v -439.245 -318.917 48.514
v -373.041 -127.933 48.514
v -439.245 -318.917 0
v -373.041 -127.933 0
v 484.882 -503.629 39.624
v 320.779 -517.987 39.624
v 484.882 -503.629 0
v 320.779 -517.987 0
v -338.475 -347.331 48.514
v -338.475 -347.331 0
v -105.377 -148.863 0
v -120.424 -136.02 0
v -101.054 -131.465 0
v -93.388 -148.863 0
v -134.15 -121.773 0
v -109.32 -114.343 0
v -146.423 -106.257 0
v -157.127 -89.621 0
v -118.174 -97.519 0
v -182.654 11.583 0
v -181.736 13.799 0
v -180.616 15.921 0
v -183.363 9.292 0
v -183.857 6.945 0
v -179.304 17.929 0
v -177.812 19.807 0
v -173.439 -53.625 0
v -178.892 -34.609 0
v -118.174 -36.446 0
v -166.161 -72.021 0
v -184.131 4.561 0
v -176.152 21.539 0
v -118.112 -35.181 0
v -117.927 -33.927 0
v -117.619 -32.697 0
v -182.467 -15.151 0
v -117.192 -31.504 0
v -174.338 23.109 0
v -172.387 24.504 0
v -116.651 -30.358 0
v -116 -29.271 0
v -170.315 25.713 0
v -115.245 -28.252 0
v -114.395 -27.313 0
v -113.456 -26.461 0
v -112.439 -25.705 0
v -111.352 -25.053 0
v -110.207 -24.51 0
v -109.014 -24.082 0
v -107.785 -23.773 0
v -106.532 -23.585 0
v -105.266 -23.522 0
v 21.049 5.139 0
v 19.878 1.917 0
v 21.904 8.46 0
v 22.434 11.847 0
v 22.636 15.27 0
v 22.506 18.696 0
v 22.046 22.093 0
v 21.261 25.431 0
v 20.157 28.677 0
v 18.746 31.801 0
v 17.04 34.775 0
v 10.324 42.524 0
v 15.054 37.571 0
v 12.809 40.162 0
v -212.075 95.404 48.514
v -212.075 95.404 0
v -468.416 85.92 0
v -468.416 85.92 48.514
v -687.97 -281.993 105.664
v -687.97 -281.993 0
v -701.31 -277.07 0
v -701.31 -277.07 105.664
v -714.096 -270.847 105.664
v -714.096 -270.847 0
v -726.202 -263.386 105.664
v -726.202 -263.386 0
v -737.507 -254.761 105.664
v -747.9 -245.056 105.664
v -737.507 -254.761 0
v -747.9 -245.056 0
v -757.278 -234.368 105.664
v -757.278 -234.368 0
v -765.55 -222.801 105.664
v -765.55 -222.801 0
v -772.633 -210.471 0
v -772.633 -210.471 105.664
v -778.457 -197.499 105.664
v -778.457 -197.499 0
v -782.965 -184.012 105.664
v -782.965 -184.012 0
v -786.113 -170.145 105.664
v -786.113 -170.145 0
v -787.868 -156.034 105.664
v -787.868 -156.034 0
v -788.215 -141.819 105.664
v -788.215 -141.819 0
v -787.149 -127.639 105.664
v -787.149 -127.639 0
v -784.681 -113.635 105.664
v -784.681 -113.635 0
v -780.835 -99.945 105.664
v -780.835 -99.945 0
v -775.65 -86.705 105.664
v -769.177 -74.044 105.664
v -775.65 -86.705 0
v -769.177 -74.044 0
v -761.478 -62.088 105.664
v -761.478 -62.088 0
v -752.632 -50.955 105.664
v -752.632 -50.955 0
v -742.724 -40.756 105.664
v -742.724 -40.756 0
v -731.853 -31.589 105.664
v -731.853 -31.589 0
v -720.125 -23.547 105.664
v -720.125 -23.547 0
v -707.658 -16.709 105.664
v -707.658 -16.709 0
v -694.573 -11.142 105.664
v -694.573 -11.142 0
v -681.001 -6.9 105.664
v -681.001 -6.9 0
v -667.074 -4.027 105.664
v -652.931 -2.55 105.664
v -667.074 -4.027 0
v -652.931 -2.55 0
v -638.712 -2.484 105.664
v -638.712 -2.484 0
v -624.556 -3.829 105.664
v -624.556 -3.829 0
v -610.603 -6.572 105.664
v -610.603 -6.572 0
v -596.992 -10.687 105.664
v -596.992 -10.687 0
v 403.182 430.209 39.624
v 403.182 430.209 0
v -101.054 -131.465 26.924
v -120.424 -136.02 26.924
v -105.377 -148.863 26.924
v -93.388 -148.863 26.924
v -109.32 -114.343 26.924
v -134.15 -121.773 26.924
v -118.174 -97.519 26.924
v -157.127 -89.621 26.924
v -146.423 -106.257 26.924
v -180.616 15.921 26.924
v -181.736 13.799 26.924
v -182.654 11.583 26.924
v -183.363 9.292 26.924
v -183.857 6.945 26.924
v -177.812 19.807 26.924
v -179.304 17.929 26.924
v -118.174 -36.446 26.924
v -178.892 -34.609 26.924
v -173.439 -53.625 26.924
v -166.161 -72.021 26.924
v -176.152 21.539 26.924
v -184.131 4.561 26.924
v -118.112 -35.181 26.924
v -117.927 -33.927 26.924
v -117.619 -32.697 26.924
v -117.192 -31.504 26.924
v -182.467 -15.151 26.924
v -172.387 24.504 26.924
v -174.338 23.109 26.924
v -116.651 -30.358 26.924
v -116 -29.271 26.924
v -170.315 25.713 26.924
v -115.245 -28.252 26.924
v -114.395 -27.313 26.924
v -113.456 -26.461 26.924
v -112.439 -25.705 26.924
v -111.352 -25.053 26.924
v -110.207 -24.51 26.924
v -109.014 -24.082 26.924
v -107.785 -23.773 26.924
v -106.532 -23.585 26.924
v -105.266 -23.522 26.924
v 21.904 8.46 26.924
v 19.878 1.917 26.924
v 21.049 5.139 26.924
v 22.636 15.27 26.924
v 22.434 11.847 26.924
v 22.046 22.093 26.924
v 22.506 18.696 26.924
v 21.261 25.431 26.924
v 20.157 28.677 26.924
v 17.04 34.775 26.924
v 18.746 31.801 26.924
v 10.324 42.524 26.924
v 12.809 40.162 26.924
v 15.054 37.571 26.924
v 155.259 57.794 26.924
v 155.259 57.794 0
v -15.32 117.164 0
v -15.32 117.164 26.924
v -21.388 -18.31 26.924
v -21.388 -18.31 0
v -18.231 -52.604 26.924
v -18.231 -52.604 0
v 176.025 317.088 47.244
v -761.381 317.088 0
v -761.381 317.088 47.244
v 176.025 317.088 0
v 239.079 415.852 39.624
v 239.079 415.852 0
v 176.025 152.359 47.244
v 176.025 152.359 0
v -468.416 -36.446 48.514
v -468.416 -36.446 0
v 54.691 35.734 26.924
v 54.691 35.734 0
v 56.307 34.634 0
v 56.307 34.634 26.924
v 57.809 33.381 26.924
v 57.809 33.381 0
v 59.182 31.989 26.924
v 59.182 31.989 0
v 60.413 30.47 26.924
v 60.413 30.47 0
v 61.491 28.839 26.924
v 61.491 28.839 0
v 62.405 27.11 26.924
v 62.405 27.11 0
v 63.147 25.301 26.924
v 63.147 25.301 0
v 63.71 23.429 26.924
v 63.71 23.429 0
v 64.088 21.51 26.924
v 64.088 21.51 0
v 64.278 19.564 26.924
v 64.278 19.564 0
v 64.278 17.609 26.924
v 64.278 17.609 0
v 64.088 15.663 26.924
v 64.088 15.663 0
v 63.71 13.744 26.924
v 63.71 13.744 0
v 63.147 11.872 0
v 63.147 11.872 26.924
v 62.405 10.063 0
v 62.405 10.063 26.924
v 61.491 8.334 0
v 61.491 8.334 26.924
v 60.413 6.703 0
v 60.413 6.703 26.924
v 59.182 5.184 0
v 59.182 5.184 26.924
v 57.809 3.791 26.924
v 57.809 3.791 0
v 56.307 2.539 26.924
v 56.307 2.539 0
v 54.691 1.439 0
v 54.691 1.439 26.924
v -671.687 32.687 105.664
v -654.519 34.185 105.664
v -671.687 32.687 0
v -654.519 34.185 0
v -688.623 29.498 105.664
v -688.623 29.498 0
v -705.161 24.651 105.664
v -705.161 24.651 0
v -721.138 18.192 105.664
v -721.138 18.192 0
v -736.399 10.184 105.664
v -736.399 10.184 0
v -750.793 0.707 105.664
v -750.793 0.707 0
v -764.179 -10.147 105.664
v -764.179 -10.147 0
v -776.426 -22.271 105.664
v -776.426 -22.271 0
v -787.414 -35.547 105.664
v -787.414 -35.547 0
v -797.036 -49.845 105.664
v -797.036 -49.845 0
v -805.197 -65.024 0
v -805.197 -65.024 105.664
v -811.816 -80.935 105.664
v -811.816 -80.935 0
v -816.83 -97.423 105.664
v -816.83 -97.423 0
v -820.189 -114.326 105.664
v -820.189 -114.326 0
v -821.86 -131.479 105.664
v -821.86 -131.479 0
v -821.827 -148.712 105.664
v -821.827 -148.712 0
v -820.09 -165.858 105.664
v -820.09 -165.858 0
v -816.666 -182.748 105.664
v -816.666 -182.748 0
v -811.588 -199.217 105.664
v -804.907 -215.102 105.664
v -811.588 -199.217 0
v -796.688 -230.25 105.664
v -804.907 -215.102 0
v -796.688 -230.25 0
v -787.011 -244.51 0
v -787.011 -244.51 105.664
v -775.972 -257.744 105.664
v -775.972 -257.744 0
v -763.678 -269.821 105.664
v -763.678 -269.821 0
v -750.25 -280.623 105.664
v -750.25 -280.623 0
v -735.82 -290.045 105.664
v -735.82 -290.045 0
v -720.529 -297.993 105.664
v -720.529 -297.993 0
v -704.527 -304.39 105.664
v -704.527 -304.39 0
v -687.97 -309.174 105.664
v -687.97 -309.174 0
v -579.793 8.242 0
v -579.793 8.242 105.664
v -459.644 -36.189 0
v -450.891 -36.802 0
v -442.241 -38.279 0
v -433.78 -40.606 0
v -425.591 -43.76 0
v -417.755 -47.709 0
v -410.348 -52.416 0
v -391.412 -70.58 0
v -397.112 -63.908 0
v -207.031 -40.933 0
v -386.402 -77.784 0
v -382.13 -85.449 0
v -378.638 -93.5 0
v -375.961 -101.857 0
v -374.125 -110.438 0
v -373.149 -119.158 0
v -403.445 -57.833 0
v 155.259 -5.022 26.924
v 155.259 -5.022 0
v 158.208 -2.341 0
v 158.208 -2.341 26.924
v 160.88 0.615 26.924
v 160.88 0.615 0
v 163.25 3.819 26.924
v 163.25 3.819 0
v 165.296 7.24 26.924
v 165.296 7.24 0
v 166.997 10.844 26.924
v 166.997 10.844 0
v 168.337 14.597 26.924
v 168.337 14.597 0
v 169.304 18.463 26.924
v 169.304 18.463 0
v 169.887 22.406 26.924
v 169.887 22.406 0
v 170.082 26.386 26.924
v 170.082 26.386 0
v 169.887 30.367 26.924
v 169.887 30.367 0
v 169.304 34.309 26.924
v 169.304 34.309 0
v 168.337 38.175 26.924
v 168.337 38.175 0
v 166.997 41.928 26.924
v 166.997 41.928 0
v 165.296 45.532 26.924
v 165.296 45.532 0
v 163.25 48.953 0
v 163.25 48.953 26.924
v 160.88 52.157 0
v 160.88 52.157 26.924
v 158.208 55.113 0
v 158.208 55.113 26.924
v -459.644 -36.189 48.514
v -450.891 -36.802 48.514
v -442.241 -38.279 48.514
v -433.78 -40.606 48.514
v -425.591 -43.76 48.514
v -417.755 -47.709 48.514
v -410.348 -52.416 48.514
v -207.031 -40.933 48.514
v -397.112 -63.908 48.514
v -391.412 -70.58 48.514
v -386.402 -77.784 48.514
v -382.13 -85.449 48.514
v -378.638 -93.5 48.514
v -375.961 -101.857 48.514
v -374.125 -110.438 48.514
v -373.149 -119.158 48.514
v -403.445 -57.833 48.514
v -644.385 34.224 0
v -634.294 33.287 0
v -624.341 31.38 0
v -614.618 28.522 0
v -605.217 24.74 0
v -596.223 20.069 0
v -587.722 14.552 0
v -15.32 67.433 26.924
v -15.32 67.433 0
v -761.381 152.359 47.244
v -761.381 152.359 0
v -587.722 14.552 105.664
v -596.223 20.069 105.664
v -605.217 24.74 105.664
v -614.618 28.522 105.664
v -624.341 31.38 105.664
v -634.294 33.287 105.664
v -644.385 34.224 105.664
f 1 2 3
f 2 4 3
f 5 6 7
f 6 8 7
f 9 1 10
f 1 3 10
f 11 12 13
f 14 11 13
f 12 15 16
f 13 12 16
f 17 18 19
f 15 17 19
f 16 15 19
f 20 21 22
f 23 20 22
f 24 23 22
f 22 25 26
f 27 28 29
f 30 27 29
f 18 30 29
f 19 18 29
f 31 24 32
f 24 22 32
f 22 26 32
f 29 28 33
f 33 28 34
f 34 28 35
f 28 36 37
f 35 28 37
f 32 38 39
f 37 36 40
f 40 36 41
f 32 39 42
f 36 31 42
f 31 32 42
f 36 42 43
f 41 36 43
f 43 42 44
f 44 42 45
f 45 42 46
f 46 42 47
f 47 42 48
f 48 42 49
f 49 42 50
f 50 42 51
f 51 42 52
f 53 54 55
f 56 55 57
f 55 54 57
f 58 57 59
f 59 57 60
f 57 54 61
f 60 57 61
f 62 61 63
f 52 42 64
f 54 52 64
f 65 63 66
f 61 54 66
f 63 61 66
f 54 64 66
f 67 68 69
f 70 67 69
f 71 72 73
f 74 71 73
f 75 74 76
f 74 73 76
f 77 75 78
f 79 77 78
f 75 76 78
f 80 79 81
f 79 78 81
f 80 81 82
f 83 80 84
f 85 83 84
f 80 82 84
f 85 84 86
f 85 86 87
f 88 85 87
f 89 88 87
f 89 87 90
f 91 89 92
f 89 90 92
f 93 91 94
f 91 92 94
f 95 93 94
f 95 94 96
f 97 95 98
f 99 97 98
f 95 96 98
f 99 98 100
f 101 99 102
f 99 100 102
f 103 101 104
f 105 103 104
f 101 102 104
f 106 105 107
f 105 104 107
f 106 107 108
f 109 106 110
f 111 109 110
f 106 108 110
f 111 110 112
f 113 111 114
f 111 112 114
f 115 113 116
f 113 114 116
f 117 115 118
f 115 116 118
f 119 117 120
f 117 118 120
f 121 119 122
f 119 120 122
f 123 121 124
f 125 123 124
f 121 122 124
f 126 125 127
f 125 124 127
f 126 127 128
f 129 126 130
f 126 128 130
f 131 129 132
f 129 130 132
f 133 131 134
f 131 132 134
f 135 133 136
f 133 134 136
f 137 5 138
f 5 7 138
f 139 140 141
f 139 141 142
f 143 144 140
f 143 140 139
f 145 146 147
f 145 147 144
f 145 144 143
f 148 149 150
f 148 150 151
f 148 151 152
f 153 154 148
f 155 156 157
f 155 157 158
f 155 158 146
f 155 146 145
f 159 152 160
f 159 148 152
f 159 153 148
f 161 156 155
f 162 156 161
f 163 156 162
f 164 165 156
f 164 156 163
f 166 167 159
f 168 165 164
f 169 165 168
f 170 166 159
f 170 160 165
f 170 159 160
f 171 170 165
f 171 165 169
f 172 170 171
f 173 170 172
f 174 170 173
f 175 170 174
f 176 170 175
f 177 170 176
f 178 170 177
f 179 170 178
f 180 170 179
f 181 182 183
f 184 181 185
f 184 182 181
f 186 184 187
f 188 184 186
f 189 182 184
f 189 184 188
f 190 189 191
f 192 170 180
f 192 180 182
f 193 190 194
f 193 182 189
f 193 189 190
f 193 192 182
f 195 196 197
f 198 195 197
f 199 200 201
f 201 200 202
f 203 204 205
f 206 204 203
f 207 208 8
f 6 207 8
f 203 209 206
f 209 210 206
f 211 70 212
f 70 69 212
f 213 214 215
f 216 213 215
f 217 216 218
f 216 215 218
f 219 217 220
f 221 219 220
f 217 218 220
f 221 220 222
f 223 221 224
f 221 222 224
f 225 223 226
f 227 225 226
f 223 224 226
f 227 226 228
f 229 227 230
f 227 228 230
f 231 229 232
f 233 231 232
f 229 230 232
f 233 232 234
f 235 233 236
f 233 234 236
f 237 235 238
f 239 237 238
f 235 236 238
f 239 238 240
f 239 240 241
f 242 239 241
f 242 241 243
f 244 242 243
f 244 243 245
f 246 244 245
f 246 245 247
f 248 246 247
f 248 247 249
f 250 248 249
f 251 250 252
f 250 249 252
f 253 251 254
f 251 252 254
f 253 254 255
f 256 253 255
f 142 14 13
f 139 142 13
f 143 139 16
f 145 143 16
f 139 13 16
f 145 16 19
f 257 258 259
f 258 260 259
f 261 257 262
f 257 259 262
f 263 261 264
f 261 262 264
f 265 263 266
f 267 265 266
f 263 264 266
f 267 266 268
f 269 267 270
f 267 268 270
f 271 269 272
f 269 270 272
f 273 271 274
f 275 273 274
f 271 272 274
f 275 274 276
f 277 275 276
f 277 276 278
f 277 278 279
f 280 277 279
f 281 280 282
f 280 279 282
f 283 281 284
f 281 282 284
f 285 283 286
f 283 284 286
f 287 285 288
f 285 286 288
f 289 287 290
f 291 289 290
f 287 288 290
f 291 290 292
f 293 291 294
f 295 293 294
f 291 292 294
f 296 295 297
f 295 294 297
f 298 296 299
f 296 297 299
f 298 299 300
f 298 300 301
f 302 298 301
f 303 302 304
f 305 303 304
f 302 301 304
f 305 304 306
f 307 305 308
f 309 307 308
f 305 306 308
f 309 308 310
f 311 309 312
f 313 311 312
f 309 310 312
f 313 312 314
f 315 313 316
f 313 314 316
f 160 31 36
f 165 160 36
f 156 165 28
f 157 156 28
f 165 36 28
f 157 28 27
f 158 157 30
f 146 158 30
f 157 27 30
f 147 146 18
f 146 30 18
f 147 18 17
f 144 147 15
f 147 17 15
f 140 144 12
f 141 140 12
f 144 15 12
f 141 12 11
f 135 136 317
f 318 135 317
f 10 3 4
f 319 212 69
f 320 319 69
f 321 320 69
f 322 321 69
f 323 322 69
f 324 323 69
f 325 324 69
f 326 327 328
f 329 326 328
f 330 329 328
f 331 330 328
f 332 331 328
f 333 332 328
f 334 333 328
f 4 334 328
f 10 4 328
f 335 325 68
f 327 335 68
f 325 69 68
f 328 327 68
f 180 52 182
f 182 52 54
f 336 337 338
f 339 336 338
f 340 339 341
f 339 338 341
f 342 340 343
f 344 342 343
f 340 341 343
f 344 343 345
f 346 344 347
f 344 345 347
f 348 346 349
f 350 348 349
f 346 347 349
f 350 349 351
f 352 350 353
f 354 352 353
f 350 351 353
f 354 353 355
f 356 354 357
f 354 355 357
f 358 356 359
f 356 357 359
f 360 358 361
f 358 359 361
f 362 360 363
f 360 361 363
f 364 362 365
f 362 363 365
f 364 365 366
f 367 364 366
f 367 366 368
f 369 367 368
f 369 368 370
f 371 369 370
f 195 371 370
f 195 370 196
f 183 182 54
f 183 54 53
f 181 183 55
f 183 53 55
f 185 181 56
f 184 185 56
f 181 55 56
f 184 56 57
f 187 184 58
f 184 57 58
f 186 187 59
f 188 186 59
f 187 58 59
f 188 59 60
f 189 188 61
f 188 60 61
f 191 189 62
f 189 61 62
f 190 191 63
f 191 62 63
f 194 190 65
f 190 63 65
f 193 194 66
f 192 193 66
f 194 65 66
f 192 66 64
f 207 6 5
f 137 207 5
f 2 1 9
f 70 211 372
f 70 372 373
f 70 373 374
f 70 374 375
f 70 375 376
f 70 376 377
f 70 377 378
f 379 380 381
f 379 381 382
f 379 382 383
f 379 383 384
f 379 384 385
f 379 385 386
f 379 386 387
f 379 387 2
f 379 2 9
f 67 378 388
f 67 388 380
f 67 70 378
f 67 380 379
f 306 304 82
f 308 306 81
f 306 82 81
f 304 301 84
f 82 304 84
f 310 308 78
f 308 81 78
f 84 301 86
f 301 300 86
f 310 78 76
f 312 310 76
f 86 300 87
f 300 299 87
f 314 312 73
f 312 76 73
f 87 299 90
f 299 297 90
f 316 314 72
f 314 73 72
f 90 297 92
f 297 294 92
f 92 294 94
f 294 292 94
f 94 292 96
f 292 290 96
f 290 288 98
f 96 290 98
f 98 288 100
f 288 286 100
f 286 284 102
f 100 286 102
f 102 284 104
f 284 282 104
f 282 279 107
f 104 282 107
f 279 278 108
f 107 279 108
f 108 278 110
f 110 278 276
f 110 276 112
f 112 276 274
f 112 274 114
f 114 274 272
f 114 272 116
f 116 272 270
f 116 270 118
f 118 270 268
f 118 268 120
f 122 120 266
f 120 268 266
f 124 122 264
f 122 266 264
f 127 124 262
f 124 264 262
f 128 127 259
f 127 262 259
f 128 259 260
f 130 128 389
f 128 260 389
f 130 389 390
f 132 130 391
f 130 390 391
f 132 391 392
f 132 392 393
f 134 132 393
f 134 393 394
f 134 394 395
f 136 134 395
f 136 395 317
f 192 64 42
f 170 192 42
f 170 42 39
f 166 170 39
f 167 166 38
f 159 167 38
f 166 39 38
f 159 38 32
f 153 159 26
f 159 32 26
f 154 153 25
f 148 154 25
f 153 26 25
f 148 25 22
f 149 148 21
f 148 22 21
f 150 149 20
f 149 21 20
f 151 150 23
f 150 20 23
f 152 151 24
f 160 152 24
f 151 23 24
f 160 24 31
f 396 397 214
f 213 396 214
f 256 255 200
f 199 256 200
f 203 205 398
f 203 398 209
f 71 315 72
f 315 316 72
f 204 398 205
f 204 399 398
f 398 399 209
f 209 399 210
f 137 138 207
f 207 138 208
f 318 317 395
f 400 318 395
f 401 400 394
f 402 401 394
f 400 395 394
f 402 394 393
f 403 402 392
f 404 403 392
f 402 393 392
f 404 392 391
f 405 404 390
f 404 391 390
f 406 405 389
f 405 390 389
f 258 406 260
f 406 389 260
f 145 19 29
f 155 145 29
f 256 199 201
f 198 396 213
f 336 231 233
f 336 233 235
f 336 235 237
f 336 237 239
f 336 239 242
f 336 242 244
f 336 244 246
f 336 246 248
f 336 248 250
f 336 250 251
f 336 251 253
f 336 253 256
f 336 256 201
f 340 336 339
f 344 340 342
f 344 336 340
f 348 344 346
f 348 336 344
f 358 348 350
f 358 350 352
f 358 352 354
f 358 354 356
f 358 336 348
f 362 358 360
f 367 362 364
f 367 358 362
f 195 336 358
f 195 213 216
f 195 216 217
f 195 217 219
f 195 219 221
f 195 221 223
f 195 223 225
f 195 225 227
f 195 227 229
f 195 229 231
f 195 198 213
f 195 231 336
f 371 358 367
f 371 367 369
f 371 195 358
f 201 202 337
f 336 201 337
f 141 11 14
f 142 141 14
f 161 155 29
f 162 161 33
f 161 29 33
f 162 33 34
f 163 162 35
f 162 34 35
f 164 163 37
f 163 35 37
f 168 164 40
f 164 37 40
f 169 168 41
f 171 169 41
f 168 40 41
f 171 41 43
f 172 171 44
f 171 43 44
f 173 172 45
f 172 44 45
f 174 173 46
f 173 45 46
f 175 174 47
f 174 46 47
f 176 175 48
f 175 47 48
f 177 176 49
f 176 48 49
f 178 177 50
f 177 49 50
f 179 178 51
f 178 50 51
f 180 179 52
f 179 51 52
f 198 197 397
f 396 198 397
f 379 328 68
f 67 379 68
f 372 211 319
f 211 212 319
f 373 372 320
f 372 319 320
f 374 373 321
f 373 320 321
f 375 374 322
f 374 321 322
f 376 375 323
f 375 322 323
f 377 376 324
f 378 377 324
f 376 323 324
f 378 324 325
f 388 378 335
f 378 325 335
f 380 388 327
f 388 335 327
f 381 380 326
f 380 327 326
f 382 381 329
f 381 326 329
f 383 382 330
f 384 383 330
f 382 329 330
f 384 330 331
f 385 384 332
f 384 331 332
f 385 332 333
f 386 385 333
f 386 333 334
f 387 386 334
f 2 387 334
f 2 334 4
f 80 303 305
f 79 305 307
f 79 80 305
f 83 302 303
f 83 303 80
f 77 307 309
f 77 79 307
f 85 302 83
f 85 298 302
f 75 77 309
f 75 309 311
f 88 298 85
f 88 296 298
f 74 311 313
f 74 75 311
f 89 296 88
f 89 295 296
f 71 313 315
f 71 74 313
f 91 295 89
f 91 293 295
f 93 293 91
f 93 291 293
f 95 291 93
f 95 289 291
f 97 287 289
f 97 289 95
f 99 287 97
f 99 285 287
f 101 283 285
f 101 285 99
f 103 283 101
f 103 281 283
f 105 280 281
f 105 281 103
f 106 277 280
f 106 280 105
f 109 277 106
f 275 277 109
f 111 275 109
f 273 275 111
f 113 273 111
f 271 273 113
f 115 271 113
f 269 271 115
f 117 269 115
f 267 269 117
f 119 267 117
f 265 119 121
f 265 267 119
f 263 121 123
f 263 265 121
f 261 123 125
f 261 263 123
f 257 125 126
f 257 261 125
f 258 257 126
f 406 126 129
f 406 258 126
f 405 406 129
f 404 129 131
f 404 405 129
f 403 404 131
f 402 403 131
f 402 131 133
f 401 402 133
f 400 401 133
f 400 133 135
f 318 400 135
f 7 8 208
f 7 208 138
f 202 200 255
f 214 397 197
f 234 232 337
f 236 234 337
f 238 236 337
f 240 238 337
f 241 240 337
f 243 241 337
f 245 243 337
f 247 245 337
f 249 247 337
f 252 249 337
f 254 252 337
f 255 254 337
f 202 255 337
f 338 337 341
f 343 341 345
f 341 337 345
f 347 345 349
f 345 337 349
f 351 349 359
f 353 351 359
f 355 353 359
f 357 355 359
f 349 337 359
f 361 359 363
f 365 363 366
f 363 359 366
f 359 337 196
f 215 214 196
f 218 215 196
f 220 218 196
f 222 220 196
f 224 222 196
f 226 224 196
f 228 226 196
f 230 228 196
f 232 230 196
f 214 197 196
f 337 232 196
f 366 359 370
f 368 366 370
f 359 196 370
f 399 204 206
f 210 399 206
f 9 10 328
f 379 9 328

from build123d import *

# Parameters (mm, degrees)
F1_DEPTH = 26.924
F0_W     = 937.4059736729
F0_H     = 164.7293567657
F2_DEPTH = 21.59
F3_DEPTH = 12.7
F4_DEPTH = 20.32
F5_DEPTH = 78.74


with BuildPart() as f1:
    # F0 (on Top) → F1 (new body)
    with BuildSketch(Plane.XY):
        with BuildLine():
            ThreePointArc((-170.315220952, 25.7127769291), (-179.9832211949, 16.9400629821), (-184.1306090355, 4.5614559203))
            ThreePointArc((-184.1306090355, 4.5614559203), (-161.8590345594, -80.9308940519), (-105.3771823645, -148.8629579544))
            Line((-105.3771823645, -148.8629579544), (-93.3883413672, -148.8629579544))
            ThreePointArc((-93.3883413672, -148.8629579544), (-105.1126589408, -122.8680418317), (-118.1744709611, -97.5187942386))
            Line((-118.1744709611, -97.5187942386), (-118.1744709611, -36.4463701844))
            ThreePointArc((-118.1744709611, -36.4463701844), (-114.3945714706, -27.3128967764), (-105.2657812834, -23.521700874))
            Line((-105.2657812834, -23.521700874), (19.8781080544, 1.9170666346))
            ThreePointArc((19.8781080544, 1.9170666346), (21.6939024895, 23.7715948588), (10.3239035234, 42.5236783922))
            Line((10.3239035234, 42.5236783922), (-170.315220952, 25.7127769291))
        make_face()
    extrude(amount=F1_DEPTH)


with BuildPart() as f1b:
    # F0 (on Top) → F1, piece 2 (new body)
    with BuildSketch(Plane.XY):
        with BuildLine():
            Line((54.6909198165, 1.4387500705), (-21.3884562254, -18.3101519942))
            Line((-21.3884562254, -18.3101519942), (-18.2305593044, -52.6044256985))
            Line((-18.2305593044, -52.6044256985), (155.2591323853, -5.0221821293))
            ThreePointArc((155.2591323853, -5.0221821293), (170.0823851438, 26.3860397972), (155.2591323853, 57.7942617238))
            Line((155.2591323853, 57.7942617238), (-15.3201334178, 117.1635612845))
            Line((-15.3201334178, 117.1635612845), (-15.3201334178, 67.4326047301))
            Line((-15.3201334178, 67.4326047301), (54.6909198165, 35.7340909541))
            ThreePointArc((54.6909198165, 35.7340909541), (64.3015376423, 18.5864205123), (54.6909198165, 1.4387500705))
        make_face()
    extrude(amount=F1_DEPTH)


with BuildPart() as f1c:
    # F0 (on Top) → F1, piece 3 (new body)
    with BuildSketch(Plane.XY):
        with BuildLine():
            Line((-212.0754271746, 95.4043865204), (-468.4157967567, 85.9202593565))
            Line((-468.4157967567, 85.9202593565), (-468.4157967567, -36.4463701844))
            ThreePointArc((-468.4157967567, -36.4463701844), (-400.203203644, -60.7919331571), (-373.0413913727, -127.932831645))
            Line((-373.0413913727, -127.932831645), (-439.2448961735, -318.9170658588))
            Line((-439.2448961735, -318.9170658588), (-338.4751677513, -347.3312854767))
            Line((-338.4751677513, -347.3312854767), (-207.0312013677, -40.9327465904))
            Line((-207.0312013677, -40.9327465904), (-212.0754271746, 95.4043865204))
        make_face()
    extrude(amount=F1_DEPTH)

    # F2 (add): a face of the model
    f2_faces = [f1c.faces().sort_by_distance(p)[0] for p in [
        (-334.4542922545, -81.4370154197, 26.924),
    ]]
    extrude(f2_faces, amount=F2_DEPTH)


with BuildPart() as f1d:
    # F0 (on Top) → F1, piece 4 (new body)
    with BuildSketch(Plane.XY):
        with Locations((-292.677924037, 234.7231805325)):
            Rectangle(F0_W, F0_H)
    extrude(amount=F1_DEPTH)

    # F4 (add): a face of the model
    f4_faces = [f1d.faces().sort_by_distance(p)[0] for p in [
        (-292.677924037, 234.7231805325, 26.924),
    ]]
    extrude(f4_faces, amount=F4_DEPTH)


with BuildPart() as f1e:
    # F0 (on Top) → F1, piece 5 (new body)
    with BuildSketch(Plane.XY):
        Polygon((239.0791658335, 415.8523497636), (320.779479725, -517.9865111688), (484.8819915551, -503.6294017275), (403.1816776636, 430.2094592049), align=None)
    extrude(amount=F1_DEPTH)

    # F3 (add): a face of the model
    f3_faces = [f1e.faces().sort_by_distance(p)[0] for p in [
        (361.9805786943, -43.888525982, 26.924),
    ]]
    extrude(f3_faces, amount=F3_DEPTH)


with BuildPart() as f1f:
    # F0 (on Top) → F1, piece 6 (new body)
    with BuildSketch(Plane.XY):
        with BuildLine():
            ThreePointArc((-579.7931551933, 8.2416180521), (-614.6184627779, 28.5222402742), (-654.5188426971, 34.1848693788))
            ThreePointArc((-654.5188426971, 34.1848693788), (-821.2371231837, -122.8817826196), (-687.970161438, -309.1741204262))
            Line((-687.970161438, -309.1741204262), (-687.970161438, -281.9933593273))
            ThreePointArc((-687.970161438, -281.9933593273), (-780.8353859156, -99.9452267127), (-596.9918370247, -10.6870504096))
            Line((-596.9918370247, -10.6870504096), (-579.7931551933, 8.2416180521))
        make_face()
    extrude(amount=F1_DEPTH)

    # F5 (add): a face of the model
    f5_faces = [f1f.faces().sort_by_distance(p)[0] for p in [
        (-615.9970762529, 24.5513486374, 26.924),
    ]]
    extrude(f5_faces, amount=F5_DEPTH)


solid = Compound([f1.part, f1b.part, f1c.part, f1d.part, f1e.part, f1f.part])
